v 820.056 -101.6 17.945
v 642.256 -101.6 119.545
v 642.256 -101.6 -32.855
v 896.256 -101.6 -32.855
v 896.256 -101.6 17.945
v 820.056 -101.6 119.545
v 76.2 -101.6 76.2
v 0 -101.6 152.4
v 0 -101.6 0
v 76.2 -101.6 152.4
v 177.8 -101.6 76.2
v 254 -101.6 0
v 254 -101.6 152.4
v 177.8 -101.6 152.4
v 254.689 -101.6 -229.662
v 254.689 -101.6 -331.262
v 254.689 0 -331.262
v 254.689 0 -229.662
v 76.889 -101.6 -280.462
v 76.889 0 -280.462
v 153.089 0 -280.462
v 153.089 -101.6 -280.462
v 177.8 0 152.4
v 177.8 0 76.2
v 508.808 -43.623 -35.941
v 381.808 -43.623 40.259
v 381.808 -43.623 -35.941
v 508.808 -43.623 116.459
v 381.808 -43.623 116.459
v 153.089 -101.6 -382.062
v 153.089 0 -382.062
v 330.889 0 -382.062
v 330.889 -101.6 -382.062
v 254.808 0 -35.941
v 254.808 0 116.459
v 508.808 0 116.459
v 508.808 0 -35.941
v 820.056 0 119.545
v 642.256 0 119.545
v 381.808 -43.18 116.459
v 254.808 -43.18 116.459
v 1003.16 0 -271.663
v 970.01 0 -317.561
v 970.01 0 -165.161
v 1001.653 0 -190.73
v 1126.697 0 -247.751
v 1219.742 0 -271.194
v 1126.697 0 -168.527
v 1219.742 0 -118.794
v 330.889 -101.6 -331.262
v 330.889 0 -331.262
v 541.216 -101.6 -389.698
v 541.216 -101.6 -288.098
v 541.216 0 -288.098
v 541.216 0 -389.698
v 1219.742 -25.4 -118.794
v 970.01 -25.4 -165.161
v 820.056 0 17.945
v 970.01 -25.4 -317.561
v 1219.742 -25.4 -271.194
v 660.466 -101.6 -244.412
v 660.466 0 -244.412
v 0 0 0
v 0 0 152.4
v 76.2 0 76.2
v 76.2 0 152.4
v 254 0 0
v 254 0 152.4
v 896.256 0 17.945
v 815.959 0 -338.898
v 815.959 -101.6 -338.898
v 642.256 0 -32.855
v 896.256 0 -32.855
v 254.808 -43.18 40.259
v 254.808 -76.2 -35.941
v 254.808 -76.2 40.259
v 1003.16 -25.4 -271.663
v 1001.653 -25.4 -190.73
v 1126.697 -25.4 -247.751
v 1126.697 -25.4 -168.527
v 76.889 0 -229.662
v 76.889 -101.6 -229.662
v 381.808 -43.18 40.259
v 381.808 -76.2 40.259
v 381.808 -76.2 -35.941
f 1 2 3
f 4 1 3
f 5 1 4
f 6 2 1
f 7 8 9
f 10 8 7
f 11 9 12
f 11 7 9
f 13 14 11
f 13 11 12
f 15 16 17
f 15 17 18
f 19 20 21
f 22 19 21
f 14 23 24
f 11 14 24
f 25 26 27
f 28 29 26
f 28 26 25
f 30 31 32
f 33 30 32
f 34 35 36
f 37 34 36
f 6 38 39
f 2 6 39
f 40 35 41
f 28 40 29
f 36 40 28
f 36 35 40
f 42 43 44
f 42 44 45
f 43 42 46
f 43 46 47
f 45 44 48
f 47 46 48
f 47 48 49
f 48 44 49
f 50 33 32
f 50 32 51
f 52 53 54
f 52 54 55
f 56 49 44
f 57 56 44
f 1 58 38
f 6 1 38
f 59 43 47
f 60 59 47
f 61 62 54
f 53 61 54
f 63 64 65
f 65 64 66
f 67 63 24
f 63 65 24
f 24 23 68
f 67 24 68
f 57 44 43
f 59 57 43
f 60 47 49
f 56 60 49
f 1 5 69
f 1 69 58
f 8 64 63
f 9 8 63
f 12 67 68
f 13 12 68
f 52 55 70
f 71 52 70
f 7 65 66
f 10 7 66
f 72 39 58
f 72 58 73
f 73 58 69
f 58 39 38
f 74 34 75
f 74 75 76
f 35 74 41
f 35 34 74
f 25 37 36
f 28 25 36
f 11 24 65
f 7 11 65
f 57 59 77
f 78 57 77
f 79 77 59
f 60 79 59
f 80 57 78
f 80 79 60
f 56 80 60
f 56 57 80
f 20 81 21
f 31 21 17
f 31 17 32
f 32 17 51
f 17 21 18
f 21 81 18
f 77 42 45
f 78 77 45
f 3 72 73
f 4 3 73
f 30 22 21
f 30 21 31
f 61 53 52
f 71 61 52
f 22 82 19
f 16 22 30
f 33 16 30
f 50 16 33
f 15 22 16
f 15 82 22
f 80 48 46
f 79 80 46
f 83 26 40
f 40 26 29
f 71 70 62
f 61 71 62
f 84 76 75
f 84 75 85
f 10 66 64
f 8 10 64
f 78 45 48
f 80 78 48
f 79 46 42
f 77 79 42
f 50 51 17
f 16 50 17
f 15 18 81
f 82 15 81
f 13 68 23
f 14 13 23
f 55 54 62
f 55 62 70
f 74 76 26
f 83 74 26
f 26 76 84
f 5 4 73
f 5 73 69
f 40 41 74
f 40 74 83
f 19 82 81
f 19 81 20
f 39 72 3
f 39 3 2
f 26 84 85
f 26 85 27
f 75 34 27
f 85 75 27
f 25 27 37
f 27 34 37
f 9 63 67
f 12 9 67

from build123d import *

# Parameters (mm, degrees)
F1_DEPTH  = 101.6
F2_W      = 254
F2_H      = 152.4
F3_DEPTH  = 76.2
F4_W      = 127
F4_H      = 32.576854
F5_DEPTH  = 152.4
F6_W      = 127
F6_H      = 76.2
F7_DEPTH  = 33.02
F8_W      = 50.8
F8_H      = 152.4
F9_DEPTH  = 101.6
F11_DEPTH = 101.6
F13_DEPTH = 101.6
F15_DEPTH = 25.4


with BuildPart() as f1:
    # F0 (on Front) → F1 (new body)
    with BuildSketch(Plane.XZ):
        Polygon((254, 0), (254, 152.4), (177.8, 152.4), (177.8, 76.2), (76.2, 76.2), (76.2, 152.4), (0, 152.4), (0, 0), align=None)
    extrude(amount=F1_DEPTH)


with BuildPart() as f3:
    # F2 (on Front) → F3 (new body)
    with BuildSketch(Plane.XZ):
        with Locations((381.808445, 40.258636)):
            Rectangle(F2_W, F2_H)
    extrude(amount=F3_DEPTH)

    # F4 (on face) → F5 (cut)
    with BuildSketch(Plane.XY.offset(116.458636)):
        with Locations((445.308445, -59.911573)):
            Rectangle(F4_W, F4_H)
    extrude(amount=-F5_DEPTH, mode=Mode.SUBTRACT)

    # F6 (on face) → F7 (cut)
    with BuildSketch(Plane.XZ.offset(76.2)):
        with Locations((318.308445, 78.358636)):
            Rectangle(F6_W, F6_H)
    extrude(amount=-F7_DEPTH, mode=Mode.SUBTRACT)


with BuildPart() as f9:
    # F8 (on Front) → F9 (new body)
    with BuildSketch(Plane.XZ):
        Polygon((820.055872, 119.54508), (693.055872, 119.54508), (693.055872, -32.85492), (896.255872, -32.85492), (896.255872, 17.94508), (820.055872, 17.94508), align=None)
        with Locations((667.655872, 43.34508)):
            Rectangle(F8_W, F8_H)
    extrude(amount=F9_DEPTH)


with BuildPart() as f11:
    # F10 (on Front) → F11 (new body)
    with BuildSketch(Plane.XZ):
        Polygon((254.68887, -229.662478), (76.88887, -229.662478), (76.88887, -280.462478), (153.08887, -280.462478), (153.08887, -382.062478), (330.88887, -382.062478), (330.88887, -331.262478), (254.68887, -331.262478), align=None)
    extrude(amount=F11_DEPTH)


with BuildPart() as f13:
    # F12 (on Front) → F13 (new body)
    with BuildSketch(Plane.XZ):
        Polygon((660.466036, -244.411736), (541.216353, -288.098267), (541.216353, -389.698267), (815.95936, -338.898267), align=None)
    extrude(amount=F13_DEPTH)


with BuildPart() as f15:
    # F14 (on Front) → F15 (new body)
    with BuildSketch(Plane.XZ):
        Polygon((1219.741796, -271.194316), (1219.741796, -118.794316), (970.009744, -165.161352), (970.009744, -317.561352), align=None)
        Polygon((1003.159642, -271.662861), (1001.652837, -190.73011), (1126.696877, -168.526778), (1126.696877, -247.750873), align=None, mode=Mode.SUBTRACT)
    extrude(amount=F15_DEPTH)


solid = Compound([f1.part, f3.part, f9.part, f11.part, f13.part, f15.part])
